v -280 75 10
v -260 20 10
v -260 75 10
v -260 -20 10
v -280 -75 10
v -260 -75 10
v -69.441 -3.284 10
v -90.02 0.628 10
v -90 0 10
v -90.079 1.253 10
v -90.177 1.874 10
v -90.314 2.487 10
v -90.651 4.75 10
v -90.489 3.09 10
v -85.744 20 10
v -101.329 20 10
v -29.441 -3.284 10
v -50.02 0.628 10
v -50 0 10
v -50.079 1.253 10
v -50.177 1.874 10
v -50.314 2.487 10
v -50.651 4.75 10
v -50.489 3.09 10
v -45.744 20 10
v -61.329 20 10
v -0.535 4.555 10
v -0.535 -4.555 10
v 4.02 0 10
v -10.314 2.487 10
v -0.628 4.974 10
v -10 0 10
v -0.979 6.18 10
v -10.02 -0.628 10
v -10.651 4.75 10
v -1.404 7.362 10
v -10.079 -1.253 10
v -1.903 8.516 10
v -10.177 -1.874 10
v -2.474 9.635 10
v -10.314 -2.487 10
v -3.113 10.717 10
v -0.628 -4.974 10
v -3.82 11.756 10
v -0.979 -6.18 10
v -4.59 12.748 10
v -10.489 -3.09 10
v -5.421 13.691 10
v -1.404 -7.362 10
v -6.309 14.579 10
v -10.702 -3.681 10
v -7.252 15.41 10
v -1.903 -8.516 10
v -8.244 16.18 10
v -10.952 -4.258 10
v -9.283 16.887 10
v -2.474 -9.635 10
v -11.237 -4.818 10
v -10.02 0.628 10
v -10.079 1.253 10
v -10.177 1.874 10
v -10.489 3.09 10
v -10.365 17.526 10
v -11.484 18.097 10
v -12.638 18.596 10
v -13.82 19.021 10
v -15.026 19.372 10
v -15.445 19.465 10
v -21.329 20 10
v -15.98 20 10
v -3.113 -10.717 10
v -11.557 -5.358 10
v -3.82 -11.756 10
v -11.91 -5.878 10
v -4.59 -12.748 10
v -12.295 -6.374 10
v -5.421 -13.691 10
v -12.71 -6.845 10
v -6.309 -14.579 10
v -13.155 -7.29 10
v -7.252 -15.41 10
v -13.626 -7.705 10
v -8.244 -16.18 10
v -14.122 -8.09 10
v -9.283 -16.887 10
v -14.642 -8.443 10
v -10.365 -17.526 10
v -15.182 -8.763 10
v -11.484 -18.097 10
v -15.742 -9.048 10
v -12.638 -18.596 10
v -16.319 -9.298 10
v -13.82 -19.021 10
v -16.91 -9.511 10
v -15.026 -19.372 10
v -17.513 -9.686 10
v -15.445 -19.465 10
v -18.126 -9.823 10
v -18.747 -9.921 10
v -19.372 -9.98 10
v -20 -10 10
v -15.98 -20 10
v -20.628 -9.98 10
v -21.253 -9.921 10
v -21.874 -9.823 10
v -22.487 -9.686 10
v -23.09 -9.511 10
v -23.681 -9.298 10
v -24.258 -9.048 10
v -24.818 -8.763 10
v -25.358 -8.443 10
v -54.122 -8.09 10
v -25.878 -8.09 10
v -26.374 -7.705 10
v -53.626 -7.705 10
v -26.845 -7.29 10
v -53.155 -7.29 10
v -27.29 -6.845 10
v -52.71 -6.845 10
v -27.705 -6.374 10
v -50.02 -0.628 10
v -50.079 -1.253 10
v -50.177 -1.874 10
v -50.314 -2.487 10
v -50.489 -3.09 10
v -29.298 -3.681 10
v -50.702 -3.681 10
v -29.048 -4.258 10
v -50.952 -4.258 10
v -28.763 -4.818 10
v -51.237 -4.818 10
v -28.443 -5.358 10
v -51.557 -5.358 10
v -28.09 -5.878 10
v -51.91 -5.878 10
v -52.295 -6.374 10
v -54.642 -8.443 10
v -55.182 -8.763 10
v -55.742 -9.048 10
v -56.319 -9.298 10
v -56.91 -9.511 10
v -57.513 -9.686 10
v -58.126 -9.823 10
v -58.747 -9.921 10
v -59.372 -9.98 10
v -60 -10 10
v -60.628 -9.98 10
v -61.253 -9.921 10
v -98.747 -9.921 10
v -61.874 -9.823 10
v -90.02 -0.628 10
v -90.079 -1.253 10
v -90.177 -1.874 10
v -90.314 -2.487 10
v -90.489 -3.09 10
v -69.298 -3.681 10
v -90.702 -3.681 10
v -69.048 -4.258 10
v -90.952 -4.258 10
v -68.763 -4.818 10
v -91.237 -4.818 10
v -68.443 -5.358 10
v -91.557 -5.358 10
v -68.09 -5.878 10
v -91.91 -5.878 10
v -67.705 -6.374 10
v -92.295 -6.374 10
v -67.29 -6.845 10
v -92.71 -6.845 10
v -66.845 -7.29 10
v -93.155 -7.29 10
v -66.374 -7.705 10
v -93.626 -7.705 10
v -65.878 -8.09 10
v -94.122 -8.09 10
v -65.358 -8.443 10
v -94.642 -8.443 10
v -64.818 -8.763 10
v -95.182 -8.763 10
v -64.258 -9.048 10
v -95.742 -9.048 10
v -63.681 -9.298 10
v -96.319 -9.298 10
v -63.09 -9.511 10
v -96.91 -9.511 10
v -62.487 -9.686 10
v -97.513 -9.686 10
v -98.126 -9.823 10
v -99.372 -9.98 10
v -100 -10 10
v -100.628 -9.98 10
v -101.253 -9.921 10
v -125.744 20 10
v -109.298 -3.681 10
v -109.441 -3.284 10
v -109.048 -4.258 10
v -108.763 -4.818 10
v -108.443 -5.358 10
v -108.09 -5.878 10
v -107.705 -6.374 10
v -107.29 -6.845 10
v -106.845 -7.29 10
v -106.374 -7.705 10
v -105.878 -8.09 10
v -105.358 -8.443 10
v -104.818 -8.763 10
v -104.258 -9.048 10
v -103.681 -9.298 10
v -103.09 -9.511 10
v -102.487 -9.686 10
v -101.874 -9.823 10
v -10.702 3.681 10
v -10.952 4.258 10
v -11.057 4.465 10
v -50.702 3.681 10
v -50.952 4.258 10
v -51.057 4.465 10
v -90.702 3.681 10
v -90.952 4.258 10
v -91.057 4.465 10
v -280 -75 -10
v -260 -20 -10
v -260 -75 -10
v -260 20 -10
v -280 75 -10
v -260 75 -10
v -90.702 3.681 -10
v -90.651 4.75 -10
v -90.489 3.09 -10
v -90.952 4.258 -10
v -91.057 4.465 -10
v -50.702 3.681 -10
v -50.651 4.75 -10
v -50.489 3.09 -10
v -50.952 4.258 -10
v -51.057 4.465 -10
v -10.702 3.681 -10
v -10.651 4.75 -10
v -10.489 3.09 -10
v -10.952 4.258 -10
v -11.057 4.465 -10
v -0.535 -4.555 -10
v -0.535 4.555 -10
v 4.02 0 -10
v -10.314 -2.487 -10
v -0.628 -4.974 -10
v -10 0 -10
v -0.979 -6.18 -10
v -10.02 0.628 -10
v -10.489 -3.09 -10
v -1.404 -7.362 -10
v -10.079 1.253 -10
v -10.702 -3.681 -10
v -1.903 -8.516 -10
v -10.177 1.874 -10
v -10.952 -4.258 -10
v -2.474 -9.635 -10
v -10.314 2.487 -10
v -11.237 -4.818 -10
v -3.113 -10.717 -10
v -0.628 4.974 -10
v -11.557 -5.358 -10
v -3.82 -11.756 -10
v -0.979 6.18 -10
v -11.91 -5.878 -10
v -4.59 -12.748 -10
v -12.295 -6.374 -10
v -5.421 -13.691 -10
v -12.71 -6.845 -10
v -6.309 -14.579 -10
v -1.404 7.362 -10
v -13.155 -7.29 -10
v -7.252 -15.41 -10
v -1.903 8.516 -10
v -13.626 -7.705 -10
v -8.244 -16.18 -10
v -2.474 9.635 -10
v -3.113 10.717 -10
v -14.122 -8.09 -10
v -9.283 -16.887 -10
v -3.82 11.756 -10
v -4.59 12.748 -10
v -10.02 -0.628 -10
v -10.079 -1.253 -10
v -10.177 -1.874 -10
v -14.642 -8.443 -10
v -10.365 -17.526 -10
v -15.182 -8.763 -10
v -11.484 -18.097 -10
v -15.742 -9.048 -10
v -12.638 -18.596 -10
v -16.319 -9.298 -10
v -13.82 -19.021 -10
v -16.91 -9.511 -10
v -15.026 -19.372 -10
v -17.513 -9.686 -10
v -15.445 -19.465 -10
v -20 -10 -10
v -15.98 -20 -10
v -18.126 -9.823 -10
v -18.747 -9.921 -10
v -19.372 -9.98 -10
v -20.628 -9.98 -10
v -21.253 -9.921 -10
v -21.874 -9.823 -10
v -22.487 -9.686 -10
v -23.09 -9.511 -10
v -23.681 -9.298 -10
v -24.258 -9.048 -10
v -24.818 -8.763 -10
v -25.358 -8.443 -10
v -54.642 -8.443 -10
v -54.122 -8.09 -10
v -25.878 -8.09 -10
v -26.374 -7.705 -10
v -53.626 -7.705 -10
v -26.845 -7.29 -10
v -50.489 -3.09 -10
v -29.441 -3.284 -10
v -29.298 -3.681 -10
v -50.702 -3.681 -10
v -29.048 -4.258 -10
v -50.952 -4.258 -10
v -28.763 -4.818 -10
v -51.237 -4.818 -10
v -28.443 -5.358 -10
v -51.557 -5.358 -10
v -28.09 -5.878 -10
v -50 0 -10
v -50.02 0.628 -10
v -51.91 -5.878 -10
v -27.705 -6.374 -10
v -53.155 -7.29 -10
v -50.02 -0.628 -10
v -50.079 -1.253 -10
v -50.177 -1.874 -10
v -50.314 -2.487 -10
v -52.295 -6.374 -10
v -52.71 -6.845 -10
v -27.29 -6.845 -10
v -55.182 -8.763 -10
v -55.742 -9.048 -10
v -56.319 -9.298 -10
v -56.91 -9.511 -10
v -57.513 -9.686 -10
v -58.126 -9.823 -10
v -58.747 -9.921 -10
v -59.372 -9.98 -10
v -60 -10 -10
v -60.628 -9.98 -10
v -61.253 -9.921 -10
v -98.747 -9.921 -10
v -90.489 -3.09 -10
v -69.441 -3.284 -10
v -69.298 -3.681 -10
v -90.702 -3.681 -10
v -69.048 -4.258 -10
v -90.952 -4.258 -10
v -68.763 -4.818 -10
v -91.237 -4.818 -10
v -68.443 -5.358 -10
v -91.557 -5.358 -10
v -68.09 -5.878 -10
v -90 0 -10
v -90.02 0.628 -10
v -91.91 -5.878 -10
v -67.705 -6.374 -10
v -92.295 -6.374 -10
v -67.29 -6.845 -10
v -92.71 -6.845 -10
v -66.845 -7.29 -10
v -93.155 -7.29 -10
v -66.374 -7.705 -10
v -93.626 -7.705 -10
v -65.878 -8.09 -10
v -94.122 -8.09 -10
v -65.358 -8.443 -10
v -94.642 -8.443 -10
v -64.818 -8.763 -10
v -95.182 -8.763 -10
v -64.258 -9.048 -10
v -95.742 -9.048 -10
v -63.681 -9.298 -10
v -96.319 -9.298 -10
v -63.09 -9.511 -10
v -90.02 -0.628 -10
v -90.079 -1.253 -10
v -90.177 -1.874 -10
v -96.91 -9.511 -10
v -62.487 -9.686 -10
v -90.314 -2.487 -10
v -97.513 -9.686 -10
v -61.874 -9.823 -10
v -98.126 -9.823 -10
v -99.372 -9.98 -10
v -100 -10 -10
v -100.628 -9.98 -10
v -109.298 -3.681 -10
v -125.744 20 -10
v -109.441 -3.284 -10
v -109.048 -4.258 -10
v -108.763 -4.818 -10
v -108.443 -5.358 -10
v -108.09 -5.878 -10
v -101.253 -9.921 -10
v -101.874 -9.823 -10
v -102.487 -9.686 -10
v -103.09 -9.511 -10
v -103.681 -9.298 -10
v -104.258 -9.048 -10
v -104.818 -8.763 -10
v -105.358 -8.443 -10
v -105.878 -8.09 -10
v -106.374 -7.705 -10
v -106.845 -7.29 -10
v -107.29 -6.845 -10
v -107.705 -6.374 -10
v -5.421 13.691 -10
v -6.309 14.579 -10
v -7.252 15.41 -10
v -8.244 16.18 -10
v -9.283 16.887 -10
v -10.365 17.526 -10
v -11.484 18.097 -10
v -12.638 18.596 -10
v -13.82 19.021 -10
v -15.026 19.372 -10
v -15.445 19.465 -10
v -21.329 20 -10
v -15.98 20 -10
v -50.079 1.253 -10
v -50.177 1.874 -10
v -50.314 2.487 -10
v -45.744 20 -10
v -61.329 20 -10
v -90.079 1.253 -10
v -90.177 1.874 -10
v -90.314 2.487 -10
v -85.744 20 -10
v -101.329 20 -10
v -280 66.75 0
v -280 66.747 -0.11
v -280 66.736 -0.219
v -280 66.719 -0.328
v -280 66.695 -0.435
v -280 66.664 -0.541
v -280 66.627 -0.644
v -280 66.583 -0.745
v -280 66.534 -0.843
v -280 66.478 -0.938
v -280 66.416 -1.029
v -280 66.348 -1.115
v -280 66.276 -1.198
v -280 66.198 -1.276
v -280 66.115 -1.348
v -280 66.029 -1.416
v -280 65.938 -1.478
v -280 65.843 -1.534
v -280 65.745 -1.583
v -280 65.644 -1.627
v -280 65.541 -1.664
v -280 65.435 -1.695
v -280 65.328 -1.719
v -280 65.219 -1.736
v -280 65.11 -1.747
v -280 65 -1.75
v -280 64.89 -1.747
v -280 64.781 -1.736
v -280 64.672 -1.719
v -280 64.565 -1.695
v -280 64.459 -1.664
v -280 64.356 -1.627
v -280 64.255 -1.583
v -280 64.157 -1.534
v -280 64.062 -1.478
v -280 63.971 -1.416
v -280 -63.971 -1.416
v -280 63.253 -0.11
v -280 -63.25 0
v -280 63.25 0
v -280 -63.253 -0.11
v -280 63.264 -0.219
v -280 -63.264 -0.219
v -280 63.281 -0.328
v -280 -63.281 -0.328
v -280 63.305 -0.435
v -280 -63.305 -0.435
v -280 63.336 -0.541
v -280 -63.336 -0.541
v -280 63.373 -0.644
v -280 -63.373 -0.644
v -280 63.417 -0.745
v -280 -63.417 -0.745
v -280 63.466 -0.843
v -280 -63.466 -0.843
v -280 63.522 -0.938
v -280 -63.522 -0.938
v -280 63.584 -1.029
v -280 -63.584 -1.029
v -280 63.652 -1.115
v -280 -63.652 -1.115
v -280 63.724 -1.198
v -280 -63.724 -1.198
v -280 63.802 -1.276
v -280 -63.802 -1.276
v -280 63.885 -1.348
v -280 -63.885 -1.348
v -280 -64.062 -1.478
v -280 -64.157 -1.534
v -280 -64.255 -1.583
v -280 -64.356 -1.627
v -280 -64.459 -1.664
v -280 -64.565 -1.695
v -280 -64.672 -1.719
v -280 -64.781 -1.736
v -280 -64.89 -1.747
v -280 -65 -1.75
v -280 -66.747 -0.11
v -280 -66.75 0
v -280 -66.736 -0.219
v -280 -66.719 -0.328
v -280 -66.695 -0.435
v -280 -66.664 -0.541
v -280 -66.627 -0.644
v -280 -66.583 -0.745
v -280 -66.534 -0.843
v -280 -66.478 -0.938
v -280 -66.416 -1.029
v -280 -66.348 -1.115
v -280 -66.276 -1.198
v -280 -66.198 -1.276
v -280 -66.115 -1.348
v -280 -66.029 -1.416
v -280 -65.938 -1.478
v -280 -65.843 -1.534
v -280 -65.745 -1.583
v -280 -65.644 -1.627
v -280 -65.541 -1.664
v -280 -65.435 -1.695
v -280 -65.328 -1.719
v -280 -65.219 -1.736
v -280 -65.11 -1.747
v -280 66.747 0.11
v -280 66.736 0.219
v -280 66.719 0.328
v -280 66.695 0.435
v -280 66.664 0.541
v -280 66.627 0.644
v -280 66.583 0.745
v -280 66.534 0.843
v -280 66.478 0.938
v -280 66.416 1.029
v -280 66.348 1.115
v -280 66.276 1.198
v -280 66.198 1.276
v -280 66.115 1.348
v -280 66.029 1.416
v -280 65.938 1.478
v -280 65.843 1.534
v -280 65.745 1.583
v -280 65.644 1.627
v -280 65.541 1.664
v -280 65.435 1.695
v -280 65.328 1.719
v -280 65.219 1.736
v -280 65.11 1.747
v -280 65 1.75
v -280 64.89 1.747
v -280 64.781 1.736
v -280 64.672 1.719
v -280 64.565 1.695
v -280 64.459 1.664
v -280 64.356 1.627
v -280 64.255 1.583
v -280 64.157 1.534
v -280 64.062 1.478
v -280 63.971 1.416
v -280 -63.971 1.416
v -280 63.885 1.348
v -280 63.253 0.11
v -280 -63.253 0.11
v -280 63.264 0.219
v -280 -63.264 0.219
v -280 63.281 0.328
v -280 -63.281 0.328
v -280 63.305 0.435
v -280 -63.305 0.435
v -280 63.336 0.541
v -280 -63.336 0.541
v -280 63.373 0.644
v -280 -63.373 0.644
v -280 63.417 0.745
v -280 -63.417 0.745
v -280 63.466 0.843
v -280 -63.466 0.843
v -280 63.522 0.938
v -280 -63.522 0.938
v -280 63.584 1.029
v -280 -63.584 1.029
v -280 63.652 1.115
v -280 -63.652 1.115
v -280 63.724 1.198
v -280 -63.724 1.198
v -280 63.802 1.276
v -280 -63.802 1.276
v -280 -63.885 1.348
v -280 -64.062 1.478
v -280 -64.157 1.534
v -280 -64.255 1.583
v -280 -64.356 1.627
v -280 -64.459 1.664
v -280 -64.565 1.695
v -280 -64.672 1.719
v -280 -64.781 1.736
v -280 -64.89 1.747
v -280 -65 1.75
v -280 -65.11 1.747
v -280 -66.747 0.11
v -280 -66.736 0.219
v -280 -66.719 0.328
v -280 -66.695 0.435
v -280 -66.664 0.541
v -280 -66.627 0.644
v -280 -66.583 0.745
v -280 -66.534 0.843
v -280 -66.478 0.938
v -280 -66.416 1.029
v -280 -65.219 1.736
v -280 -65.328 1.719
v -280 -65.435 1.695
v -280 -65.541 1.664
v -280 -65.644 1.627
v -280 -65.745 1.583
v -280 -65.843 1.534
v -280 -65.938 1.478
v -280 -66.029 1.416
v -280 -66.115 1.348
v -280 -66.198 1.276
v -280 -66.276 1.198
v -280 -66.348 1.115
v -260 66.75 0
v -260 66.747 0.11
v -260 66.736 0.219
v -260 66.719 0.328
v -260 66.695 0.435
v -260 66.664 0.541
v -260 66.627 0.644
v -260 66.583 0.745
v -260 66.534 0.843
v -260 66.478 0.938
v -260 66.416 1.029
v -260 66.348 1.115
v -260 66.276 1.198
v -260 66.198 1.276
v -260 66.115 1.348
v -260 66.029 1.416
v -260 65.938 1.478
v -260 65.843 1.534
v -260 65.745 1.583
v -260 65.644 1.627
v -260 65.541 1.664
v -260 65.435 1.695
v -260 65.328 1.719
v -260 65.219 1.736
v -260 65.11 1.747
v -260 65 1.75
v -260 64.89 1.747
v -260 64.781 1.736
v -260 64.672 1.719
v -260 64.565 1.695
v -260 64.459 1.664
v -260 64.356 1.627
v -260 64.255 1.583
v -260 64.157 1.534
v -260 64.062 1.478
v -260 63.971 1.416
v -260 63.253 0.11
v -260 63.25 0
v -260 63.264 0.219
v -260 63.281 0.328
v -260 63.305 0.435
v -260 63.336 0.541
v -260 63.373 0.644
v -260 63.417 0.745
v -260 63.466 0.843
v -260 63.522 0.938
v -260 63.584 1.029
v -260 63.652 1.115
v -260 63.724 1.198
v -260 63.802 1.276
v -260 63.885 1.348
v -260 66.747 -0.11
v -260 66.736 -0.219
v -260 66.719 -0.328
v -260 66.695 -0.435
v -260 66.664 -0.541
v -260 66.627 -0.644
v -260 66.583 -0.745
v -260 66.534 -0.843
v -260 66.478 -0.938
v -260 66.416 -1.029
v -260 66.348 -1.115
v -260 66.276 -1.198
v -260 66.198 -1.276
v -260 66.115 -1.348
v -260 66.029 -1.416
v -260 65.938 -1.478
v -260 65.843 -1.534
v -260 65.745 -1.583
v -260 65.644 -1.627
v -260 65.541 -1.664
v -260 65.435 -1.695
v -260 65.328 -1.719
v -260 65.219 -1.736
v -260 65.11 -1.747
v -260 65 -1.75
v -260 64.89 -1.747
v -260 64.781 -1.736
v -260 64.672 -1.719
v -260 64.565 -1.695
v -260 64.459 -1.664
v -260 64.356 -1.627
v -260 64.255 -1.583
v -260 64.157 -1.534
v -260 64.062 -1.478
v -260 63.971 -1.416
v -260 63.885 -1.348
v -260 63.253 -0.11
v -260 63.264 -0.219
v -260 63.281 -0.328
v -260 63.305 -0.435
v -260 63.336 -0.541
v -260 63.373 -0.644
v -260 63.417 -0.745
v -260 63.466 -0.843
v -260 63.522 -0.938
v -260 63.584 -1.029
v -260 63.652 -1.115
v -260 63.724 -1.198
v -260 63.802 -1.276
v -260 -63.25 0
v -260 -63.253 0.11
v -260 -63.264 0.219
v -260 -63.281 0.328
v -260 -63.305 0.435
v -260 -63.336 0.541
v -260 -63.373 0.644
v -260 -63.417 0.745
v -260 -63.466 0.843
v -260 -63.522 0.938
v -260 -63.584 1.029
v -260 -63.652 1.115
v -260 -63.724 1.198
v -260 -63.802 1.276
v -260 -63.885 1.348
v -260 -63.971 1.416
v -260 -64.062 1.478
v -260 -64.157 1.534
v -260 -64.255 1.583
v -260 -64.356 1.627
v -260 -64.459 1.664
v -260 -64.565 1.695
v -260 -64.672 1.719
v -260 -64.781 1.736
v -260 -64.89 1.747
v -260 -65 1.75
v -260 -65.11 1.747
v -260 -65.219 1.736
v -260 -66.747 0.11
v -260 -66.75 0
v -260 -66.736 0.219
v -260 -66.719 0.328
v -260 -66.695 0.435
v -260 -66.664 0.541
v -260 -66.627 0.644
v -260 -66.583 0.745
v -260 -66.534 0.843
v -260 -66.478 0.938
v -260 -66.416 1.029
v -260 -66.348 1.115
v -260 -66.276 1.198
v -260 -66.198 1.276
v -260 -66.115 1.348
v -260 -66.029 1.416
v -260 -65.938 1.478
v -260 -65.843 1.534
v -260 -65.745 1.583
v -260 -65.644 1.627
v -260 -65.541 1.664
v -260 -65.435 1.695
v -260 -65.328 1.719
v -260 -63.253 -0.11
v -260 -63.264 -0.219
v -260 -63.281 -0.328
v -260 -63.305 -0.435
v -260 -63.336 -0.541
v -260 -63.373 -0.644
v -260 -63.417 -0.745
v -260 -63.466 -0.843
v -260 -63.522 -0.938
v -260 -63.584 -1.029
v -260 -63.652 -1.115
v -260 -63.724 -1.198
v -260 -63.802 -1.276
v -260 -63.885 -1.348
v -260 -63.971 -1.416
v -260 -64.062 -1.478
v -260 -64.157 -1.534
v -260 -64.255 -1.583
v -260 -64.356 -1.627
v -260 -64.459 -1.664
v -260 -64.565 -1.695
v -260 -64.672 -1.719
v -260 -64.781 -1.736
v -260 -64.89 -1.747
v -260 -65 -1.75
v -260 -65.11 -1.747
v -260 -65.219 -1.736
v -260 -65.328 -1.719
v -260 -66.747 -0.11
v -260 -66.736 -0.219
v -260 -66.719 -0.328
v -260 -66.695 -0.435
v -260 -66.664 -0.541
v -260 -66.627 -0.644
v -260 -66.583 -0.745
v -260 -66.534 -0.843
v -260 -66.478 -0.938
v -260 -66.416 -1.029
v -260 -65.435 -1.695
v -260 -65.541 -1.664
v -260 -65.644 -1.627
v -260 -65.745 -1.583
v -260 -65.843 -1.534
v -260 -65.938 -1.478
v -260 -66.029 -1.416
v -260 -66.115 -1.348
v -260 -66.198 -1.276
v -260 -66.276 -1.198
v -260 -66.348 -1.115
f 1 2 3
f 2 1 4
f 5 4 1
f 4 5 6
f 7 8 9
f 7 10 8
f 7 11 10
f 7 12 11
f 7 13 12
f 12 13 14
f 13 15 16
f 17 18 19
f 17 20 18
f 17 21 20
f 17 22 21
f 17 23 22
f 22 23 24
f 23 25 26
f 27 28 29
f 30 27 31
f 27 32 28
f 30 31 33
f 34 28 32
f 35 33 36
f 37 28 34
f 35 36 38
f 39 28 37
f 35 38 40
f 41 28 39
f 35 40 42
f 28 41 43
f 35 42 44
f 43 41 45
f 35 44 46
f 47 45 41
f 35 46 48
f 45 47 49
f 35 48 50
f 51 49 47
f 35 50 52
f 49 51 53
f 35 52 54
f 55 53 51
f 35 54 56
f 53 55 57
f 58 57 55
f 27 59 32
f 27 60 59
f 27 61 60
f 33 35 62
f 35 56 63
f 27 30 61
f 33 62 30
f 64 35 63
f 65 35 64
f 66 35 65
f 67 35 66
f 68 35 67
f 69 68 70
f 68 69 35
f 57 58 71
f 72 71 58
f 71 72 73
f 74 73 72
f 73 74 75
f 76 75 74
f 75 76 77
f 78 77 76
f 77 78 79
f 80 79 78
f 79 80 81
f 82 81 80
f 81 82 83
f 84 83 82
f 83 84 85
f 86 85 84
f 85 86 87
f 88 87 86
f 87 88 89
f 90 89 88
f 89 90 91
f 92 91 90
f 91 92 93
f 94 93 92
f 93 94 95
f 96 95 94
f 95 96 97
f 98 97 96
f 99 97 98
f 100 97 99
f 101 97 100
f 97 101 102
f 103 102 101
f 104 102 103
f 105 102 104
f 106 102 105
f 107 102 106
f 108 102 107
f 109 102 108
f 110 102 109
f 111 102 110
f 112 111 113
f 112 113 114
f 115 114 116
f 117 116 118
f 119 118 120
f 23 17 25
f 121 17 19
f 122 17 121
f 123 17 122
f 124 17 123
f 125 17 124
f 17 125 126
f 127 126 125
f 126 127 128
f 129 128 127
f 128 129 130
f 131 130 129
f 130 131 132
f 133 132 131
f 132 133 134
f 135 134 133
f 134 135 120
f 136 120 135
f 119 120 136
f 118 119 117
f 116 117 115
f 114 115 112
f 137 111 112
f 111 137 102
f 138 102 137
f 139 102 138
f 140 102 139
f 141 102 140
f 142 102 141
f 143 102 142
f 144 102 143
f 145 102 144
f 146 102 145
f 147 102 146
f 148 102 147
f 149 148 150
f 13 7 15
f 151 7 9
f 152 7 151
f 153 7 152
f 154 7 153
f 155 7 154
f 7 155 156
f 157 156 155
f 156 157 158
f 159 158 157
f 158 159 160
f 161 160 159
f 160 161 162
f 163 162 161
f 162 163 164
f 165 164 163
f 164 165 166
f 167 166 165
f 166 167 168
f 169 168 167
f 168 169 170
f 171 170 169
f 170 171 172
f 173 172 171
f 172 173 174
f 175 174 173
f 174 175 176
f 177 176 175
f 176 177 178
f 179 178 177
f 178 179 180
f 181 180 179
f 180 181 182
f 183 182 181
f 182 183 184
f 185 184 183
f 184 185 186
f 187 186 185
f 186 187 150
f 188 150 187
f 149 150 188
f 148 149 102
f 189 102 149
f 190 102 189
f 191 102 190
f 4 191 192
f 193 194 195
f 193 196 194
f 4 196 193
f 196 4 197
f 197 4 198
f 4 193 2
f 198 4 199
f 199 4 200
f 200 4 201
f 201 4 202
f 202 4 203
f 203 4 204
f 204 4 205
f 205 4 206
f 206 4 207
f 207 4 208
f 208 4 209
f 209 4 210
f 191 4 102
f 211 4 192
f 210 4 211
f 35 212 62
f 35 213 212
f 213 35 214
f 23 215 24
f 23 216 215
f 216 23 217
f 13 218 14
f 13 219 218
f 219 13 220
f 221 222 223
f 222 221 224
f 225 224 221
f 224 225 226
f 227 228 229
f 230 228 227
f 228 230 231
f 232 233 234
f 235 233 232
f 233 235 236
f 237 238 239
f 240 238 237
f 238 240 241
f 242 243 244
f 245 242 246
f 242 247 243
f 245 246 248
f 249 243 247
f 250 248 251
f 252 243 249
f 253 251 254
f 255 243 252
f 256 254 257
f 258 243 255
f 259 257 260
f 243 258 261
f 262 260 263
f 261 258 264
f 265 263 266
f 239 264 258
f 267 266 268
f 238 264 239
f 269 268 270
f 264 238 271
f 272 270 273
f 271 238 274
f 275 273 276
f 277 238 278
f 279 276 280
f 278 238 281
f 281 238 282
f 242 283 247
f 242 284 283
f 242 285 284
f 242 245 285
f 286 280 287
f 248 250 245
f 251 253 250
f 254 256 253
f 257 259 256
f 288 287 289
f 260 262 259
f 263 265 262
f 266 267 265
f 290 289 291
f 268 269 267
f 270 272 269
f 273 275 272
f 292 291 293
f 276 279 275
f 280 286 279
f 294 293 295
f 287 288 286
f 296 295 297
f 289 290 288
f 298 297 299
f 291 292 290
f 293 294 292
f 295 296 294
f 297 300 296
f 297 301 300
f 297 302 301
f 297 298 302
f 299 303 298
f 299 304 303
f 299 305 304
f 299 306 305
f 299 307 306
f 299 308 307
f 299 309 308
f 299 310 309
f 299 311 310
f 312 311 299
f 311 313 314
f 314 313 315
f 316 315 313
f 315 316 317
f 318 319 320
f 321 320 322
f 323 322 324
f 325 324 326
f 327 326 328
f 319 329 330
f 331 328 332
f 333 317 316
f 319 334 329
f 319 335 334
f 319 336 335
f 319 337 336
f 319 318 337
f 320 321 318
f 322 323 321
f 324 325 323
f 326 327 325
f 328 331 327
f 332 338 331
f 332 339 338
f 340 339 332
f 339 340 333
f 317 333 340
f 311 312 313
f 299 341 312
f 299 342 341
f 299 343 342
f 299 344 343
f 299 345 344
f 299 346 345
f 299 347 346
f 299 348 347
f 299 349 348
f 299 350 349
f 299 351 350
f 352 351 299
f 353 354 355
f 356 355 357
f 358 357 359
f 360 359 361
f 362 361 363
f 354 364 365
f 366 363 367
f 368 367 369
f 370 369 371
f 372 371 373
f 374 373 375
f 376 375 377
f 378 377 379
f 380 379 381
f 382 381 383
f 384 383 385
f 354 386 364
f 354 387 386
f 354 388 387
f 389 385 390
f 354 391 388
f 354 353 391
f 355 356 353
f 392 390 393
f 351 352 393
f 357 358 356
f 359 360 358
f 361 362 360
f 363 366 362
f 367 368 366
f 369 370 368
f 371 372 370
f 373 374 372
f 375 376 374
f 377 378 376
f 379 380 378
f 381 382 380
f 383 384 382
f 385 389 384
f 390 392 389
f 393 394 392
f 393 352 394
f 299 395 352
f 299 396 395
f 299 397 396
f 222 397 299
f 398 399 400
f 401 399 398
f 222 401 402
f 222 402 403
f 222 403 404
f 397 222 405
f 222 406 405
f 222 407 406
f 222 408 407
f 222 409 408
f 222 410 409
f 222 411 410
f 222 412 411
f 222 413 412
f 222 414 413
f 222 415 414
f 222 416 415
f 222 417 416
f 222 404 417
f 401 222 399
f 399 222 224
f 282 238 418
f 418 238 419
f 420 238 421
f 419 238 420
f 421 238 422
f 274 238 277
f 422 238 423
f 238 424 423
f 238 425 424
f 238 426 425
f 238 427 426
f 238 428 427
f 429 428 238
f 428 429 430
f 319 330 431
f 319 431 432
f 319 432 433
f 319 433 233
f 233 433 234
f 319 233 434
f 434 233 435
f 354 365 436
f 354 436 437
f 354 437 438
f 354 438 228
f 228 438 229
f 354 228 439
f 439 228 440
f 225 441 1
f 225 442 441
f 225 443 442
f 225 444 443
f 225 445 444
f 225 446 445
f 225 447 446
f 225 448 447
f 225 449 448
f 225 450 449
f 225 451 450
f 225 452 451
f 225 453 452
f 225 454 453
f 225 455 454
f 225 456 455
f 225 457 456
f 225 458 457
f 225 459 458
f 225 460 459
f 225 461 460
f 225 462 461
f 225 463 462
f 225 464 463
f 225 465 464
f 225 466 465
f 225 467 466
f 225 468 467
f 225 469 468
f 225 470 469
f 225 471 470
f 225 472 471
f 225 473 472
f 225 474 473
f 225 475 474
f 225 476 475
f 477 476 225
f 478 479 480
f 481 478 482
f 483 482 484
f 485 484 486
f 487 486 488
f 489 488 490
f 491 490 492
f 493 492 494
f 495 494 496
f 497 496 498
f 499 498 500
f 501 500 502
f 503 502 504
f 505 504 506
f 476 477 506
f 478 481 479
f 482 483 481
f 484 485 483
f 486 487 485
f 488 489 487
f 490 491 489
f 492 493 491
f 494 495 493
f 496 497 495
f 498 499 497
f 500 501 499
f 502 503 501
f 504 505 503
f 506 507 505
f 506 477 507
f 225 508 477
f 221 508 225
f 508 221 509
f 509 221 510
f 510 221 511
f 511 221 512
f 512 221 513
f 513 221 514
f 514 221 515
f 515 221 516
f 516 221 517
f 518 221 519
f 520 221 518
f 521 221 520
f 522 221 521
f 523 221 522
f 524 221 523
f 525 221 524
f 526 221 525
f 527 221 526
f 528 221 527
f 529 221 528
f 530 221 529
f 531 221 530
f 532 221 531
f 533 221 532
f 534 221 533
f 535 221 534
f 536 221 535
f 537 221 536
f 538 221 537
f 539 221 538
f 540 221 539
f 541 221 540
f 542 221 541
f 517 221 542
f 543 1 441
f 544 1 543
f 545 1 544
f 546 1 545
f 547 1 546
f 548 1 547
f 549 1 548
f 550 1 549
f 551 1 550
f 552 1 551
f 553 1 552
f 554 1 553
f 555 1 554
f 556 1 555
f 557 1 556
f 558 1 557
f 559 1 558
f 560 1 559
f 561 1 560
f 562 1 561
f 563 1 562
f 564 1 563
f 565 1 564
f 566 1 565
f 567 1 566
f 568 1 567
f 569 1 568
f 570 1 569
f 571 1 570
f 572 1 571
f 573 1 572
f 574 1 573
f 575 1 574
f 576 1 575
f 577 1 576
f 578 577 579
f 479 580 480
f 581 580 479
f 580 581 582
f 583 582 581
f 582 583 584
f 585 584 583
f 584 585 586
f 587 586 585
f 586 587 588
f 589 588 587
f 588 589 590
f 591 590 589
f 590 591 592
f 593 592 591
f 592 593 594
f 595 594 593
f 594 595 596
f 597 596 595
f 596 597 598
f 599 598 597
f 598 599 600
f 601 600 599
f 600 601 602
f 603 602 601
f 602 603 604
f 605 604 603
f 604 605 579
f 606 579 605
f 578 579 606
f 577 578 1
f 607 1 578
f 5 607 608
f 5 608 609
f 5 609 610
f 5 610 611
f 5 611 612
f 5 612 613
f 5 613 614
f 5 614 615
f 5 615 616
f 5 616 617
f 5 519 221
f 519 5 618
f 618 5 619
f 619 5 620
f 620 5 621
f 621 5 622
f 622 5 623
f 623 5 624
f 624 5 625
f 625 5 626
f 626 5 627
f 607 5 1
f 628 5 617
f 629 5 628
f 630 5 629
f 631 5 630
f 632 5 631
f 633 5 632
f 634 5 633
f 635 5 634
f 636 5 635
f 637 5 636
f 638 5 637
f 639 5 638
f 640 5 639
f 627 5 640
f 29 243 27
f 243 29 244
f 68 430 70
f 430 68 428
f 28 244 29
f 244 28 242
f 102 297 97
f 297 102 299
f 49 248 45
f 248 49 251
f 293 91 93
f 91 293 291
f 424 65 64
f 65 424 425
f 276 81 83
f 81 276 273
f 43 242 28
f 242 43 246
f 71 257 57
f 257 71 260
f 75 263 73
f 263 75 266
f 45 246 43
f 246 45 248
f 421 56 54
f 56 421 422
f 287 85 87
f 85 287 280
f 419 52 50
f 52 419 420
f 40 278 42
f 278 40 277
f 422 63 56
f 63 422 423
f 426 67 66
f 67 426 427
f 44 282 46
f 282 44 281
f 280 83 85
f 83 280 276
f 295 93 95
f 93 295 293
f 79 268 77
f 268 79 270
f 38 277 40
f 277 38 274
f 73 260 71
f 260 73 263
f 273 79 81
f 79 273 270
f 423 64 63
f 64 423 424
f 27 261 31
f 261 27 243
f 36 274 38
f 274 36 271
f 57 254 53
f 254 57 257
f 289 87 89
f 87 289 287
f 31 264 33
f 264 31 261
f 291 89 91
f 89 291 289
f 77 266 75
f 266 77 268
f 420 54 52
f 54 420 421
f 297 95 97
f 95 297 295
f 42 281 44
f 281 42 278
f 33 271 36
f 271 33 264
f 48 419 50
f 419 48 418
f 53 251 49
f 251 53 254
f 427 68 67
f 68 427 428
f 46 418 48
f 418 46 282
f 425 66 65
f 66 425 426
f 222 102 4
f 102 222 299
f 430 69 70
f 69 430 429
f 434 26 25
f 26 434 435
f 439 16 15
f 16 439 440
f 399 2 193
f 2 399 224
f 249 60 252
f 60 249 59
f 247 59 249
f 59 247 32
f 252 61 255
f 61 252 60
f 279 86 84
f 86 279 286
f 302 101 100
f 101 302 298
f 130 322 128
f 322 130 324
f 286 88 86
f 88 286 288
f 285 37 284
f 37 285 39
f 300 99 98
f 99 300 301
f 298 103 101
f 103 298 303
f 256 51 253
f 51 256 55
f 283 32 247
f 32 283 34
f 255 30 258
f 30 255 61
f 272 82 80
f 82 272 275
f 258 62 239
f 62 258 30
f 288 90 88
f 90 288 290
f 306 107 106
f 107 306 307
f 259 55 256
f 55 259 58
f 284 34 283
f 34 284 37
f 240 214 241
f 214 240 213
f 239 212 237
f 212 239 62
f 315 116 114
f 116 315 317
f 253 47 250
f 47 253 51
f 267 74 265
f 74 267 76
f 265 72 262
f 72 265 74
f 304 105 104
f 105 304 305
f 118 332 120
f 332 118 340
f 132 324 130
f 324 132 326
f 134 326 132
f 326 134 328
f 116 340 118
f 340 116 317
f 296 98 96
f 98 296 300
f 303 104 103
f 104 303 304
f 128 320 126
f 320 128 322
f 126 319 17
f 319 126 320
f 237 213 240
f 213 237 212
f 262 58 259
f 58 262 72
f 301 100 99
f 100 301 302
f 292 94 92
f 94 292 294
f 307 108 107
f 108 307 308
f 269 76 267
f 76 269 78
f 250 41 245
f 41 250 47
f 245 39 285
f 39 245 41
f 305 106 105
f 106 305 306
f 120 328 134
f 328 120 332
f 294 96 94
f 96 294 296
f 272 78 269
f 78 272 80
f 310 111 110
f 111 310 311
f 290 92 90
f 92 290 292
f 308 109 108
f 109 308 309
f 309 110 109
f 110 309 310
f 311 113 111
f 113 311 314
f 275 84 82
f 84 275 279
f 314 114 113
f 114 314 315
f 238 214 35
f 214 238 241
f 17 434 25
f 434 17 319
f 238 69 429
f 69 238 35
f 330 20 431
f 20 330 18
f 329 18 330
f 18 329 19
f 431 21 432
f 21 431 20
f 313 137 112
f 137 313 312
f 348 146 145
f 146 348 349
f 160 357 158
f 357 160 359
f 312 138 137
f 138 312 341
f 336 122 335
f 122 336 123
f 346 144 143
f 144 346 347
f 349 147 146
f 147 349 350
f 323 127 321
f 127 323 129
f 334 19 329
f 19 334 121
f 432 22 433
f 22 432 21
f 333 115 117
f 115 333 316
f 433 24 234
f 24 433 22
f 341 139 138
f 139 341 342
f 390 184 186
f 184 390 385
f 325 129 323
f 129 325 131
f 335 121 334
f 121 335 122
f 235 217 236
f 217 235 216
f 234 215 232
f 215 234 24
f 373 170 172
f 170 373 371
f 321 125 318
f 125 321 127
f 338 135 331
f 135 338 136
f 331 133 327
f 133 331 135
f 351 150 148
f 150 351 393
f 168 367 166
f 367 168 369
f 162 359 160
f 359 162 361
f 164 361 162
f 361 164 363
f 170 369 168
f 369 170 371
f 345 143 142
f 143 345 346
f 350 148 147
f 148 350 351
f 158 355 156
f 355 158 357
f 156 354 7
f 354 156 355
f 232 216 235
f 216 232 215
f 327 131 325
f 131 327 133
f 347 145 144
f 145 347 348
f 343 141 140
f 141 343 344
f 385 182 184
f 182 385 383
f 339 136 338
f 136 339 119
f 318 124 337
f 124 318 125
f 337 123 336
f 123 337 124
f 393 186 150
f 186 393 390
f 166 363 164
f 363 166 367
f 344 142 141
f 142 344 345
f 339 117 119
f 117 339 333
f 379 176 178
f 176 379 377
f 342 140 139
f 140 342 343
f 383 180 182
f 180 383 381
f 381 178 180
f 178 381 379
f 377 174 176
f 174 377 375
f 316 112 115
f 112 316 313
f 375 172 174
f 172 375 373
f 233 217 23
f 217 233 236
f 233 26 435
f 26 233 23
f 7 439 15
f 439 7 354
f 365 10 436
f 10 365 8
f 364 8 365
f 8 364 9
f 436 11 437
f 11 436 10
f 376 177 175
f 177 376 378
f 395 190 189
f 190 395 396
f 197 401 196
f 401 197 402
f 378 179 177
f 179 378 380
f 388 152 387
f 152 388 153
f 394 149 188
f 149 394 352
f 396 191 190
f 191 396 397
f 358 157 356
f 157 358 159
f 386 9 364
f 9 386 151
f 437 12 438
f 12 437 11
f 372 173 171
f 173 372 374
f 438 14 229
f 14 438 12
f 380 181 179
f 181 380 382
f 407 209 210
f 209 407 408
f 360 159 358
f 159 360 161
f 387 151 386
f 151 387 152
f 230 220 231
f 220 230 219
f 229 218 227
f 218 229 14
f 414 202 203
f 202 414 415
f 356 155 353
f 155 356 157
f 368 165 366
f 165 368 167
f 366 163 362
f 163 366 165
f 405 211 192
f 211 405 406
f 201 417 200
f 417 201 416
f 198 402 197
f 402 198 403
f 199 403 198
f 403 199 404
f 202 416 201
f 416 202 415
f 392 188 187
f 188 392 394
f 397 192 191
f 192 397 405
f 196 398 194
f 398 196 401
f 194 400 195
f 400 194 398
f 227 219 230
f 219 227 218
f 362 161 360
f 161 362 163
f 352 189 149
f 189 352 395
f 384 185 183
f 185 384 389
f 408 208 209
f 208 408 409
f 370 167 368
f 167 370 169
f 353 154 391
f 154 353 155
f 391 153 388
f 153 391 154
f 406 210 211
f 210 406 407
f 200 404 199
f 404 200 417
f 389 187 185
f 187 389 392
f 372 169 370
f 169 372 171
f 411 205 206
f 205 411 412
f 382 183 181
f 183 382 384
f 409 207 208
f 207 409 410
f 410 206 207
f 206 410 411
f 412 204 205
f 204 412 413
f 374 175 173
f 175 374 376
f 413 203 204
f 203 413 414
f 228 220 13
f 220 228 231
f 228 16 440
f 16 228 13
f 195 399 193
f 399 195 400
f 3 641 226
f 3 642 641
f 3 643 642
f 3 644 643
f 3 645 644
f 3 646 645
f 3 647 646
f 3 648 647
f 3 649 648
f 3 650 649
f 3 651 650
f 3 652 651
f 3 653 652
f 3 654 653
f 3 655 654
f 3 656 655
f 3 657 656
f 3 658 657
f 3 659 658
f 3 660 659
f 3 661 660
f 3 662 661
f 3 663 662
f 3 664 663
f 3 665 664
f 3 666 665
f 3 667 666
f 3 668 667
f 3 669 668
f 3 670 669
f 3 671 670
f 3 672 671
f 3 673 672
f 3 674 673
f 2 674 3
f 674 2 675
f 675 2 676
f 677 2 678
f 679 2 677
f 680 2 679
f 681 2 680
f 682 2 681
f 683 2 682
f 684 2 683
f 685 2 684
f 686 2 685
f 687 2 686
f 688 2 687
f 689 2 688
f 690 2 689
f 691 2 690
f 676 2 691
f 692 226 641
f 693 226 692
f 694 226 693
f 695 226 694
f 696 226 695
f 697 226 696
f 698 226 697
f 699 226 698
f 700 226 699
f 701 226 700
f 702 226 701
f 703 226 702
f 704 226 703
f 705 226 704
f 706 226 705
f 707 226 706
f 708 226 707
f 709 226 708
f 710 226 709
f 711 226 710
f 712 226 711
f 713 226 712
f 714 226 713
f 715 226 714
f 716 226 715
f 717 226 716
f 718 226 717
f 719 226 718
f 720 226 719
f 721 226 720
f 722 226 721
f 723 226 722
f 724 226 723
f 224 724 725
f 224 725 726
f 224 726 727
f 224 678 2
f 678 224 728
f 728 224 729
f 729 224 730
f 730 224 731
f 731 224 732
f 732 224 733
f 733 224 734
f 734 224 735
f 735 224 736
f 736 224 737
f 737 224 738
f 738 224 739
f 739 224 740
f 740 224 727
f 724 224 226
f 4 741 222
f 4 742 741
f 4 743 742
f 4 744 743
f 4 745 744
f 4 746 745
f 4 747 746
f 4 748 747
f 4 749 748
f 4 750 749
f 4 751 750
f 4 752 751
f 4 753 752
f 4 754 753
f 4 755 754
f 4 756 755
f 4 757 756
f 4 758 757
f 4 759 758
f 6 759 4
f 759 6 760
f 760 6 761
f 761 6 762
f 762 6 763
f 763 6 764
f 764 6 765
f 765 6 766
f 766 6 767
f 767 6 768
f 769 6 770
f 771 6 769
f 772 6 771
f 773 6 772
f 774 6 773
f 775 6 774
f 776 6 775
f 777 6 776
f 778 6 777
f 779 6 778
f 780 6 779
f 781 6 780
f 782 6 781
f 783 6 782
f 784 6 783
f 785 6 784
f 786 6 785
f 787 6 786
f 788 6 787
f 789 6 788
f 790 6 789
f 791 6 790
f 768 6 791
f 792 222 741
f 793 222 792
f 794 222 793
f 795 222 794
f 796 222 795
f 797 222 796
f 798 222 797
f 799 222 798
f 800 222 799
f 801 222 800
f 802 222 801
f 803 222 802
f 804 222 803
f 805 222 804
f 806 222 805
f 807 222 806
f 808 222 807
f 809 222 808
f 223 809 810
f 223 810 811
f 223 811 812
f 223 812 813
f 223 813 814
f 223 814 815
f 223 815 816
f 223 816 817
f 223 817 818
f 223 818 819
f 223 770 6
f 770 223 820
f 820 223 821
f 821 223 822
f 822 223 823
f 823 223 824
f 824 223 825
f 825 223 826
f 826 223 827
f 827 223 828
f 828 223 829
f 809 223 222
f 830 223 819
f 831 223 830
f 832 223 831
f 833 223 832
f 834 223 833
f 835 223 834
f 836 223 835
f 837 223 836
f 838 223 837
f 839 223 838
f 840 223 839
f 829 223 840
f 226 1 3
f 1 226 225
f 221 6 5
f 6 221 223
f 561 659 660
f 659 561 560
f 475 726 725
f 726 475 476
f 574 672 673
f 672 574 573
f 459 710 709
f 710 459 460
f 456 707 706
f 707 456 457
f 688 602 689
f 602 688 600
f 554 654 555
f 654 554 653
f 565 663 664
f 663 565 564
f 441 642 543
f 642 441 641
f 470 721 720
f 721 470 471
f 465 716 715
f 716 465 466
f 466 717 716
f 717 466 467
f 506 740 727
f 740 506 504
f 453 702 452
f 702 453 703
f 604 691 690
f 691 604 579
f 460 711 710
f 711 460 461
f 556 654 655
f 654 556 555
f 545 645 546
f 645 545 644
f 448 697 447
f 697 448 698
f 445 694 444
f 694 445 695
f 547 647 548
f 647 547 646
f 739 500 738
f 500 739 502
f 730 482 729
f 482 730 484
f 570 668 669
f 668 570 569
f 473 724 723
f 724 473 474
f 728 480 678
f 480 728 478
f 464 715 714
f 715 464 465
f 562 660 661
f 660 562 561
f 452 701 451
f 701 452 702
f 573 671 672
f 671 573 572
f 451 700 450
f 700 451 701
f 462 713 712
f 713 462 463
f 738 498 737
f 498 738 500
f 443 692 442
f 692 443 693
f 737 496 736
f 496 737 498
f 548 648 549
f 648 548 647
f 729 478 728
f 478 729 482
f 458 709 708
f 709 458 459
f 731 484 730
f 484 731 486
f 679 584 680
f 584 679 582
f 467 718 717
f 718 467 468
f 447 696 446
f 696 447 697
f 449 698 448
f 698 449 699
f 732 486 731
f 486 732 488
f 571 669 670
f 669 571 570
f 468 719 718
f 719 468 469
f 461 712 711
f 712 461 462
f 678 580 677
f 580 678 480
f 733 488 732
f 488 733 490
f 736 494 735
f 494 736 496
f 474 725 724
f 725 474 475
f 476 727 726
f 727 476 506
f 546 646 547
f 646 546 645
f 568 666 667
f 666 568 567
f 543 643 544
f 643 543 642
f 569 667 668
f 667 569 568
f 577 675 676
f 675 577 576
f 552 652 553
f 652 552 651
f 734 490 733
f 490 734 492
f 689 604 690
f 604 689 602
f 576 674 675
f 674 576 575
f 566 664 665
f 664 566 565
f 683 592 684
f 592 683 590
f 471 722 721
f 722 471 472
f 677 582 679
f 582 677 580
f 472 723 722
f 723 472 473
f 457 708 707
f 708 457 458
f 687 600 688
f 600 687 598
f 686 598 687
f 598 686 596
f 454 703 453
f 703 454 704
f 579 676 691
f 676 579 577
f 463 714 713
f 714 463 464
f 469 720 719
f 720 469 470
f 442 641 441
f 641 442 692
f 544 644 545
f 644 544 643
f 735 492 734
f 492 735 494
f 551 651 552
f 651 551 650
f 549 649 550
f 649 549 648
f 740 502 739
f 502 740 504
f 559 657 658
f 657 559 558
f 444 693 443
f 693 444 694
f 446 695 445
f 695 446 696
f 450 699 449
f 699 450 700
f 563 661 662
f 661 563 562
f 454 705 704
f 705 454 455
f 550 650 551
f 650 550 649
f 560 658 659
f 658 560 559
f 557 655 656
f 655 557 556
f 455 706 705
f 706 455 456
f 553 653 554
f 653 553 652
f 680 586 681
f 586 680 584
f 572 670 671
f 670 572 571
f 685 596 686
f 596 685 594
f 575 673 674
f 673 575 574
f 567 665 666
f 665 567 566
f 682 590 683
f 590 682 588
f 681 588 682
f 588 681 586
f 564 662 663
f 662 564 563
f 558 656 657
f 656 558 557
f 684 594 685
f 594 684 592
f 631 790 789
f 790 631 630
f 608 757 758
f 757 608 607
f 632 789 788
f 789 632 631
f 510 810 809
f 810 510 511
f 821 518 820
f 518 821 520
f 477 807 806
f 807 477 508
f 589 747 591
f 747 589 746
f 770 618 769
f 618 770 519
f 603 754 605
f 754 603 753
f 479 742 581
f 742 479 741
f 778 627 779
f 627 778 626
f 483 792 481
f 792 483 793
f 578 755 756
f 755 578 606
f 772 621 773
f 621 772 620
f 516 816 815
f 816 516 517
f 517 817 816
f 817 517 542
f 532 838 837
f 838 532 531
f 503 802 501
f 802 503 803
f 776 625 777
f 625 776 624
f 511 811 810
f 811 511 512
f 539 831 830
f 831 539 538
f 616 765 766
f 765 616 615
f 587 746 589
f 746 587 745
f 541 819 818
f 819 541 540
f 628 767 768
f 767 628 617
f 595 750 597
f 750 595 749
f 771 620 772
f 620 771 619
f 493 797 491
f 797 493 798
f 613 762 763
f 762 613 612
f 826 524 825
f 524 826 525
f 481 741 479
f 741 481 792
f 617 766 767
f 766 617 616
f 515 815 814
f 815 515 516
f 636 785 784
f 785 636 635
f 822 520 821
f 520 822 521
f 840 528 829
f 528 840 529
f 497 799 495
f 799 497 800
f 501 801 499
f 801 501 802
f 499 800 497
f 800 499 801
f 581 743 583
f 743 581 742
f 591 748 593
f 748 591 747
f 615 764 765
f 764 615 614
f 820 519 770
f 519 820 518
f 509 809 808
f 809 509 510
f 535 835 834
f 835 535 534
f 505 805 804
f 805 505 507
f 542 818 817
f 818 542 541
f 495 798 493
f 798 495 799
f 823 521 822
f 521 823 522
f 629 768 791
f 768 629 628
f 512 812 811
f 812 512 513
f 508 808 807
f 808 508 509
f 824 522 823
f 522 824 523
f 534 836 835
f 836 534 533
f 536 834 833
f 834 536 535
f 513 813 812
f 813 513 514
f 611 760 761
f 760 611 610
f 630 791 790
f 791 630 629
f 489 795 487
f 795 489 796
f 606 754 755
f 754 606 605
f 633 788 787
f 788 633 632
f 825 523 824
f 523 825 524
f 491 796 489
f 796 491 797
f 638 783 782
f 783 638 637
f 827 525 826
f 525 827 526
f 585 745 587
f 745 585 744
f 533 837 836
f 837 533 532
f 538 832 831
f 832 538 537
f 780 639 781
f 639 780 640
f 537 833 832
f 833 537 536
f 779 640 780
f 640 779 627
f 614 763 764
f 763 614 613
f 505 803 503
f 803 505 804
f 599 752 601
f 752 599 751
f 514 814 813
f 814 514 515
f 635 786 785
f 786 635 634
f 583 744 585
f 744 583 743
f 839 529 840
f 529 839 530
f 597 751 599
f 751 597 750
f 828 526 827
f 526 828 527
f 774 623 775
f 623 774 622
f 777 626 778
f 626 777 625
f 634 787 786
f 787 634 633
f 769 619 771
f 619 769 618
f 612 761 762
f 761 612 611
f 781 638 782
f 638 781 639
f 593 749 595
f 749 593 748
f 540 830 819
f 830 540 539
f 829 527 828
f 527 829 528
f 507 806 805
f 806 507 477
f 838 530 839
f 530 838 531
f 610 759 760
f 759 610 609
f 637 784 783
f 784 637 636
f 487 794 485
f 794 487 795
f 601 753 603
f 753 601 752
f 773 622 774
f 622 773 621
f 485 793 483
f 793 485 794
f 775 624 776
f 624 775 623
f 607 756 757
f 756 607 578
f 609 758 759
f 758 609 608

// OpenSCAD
module rod_hole() {
    translate([-20,0,-25]) {
        cylinder(h=50, r=10, $fn=100, center = false);
    }
    rotate(a=[0,0,125]) translate([10,6,-25]) {
        cube(size = [50,20,40], center = false);
    }
}

module style_cut() {
    translate([200,200,0])
    cylinder(h=20, r=100, $fn=100, center = true);
}

module diag() {
        translate([200,200,0])
        rotate(a=[0,0,45])
        cube(size = [560,800,20], center = true);
}

module cdiag() {
        translate([200,-200,0])
        rotate(a=[0,0,45])
        cube(size = [800,560,20], center = true);
}

module mount_wall() {
    difference(){
        difference(){
            cube(size = [560,560,20], center = true);
            diag();
        }
        cdiag();
    }
    translate([-20,0,0]) cylinder(h=20, r=20, $fn=100, center = true);
}

module slim_wall() {
    difference(){
        difference(){
            mount_wall();
            translate([0,-300,0]) cube(size = [560,560,20], center = true);
        }
        translate([0,300,0]) cube(size = [560,560,20], center = true);
    }
} 

module hole_panel() {
    difference(){
        slim_wall();
        rod_hole(); 
        translate([-40,0,0]) rod_hole();    
        translate([-80,0,0]) rod_hole();    
    }
}

module full_arm() {
    difference(){
        hole_panel();
        style_cut();
    }
}

module arm_mount() {
    translate([-270,0,0]) cube(size = [20,150,20], center = true);
}

module screw_hole() {
    rotate([0,90,0]) cylinder(h=20, r=1.75, $fn=100, center = true);
}

module screw_mount() {
    difference() {
    difference() {
        arm_mount();
        translate([-270,65,0]) screw_hole();
    }
    translate([-270,-65,0]) screw_hole();
    }
}

full_arm();
screw_mount();
